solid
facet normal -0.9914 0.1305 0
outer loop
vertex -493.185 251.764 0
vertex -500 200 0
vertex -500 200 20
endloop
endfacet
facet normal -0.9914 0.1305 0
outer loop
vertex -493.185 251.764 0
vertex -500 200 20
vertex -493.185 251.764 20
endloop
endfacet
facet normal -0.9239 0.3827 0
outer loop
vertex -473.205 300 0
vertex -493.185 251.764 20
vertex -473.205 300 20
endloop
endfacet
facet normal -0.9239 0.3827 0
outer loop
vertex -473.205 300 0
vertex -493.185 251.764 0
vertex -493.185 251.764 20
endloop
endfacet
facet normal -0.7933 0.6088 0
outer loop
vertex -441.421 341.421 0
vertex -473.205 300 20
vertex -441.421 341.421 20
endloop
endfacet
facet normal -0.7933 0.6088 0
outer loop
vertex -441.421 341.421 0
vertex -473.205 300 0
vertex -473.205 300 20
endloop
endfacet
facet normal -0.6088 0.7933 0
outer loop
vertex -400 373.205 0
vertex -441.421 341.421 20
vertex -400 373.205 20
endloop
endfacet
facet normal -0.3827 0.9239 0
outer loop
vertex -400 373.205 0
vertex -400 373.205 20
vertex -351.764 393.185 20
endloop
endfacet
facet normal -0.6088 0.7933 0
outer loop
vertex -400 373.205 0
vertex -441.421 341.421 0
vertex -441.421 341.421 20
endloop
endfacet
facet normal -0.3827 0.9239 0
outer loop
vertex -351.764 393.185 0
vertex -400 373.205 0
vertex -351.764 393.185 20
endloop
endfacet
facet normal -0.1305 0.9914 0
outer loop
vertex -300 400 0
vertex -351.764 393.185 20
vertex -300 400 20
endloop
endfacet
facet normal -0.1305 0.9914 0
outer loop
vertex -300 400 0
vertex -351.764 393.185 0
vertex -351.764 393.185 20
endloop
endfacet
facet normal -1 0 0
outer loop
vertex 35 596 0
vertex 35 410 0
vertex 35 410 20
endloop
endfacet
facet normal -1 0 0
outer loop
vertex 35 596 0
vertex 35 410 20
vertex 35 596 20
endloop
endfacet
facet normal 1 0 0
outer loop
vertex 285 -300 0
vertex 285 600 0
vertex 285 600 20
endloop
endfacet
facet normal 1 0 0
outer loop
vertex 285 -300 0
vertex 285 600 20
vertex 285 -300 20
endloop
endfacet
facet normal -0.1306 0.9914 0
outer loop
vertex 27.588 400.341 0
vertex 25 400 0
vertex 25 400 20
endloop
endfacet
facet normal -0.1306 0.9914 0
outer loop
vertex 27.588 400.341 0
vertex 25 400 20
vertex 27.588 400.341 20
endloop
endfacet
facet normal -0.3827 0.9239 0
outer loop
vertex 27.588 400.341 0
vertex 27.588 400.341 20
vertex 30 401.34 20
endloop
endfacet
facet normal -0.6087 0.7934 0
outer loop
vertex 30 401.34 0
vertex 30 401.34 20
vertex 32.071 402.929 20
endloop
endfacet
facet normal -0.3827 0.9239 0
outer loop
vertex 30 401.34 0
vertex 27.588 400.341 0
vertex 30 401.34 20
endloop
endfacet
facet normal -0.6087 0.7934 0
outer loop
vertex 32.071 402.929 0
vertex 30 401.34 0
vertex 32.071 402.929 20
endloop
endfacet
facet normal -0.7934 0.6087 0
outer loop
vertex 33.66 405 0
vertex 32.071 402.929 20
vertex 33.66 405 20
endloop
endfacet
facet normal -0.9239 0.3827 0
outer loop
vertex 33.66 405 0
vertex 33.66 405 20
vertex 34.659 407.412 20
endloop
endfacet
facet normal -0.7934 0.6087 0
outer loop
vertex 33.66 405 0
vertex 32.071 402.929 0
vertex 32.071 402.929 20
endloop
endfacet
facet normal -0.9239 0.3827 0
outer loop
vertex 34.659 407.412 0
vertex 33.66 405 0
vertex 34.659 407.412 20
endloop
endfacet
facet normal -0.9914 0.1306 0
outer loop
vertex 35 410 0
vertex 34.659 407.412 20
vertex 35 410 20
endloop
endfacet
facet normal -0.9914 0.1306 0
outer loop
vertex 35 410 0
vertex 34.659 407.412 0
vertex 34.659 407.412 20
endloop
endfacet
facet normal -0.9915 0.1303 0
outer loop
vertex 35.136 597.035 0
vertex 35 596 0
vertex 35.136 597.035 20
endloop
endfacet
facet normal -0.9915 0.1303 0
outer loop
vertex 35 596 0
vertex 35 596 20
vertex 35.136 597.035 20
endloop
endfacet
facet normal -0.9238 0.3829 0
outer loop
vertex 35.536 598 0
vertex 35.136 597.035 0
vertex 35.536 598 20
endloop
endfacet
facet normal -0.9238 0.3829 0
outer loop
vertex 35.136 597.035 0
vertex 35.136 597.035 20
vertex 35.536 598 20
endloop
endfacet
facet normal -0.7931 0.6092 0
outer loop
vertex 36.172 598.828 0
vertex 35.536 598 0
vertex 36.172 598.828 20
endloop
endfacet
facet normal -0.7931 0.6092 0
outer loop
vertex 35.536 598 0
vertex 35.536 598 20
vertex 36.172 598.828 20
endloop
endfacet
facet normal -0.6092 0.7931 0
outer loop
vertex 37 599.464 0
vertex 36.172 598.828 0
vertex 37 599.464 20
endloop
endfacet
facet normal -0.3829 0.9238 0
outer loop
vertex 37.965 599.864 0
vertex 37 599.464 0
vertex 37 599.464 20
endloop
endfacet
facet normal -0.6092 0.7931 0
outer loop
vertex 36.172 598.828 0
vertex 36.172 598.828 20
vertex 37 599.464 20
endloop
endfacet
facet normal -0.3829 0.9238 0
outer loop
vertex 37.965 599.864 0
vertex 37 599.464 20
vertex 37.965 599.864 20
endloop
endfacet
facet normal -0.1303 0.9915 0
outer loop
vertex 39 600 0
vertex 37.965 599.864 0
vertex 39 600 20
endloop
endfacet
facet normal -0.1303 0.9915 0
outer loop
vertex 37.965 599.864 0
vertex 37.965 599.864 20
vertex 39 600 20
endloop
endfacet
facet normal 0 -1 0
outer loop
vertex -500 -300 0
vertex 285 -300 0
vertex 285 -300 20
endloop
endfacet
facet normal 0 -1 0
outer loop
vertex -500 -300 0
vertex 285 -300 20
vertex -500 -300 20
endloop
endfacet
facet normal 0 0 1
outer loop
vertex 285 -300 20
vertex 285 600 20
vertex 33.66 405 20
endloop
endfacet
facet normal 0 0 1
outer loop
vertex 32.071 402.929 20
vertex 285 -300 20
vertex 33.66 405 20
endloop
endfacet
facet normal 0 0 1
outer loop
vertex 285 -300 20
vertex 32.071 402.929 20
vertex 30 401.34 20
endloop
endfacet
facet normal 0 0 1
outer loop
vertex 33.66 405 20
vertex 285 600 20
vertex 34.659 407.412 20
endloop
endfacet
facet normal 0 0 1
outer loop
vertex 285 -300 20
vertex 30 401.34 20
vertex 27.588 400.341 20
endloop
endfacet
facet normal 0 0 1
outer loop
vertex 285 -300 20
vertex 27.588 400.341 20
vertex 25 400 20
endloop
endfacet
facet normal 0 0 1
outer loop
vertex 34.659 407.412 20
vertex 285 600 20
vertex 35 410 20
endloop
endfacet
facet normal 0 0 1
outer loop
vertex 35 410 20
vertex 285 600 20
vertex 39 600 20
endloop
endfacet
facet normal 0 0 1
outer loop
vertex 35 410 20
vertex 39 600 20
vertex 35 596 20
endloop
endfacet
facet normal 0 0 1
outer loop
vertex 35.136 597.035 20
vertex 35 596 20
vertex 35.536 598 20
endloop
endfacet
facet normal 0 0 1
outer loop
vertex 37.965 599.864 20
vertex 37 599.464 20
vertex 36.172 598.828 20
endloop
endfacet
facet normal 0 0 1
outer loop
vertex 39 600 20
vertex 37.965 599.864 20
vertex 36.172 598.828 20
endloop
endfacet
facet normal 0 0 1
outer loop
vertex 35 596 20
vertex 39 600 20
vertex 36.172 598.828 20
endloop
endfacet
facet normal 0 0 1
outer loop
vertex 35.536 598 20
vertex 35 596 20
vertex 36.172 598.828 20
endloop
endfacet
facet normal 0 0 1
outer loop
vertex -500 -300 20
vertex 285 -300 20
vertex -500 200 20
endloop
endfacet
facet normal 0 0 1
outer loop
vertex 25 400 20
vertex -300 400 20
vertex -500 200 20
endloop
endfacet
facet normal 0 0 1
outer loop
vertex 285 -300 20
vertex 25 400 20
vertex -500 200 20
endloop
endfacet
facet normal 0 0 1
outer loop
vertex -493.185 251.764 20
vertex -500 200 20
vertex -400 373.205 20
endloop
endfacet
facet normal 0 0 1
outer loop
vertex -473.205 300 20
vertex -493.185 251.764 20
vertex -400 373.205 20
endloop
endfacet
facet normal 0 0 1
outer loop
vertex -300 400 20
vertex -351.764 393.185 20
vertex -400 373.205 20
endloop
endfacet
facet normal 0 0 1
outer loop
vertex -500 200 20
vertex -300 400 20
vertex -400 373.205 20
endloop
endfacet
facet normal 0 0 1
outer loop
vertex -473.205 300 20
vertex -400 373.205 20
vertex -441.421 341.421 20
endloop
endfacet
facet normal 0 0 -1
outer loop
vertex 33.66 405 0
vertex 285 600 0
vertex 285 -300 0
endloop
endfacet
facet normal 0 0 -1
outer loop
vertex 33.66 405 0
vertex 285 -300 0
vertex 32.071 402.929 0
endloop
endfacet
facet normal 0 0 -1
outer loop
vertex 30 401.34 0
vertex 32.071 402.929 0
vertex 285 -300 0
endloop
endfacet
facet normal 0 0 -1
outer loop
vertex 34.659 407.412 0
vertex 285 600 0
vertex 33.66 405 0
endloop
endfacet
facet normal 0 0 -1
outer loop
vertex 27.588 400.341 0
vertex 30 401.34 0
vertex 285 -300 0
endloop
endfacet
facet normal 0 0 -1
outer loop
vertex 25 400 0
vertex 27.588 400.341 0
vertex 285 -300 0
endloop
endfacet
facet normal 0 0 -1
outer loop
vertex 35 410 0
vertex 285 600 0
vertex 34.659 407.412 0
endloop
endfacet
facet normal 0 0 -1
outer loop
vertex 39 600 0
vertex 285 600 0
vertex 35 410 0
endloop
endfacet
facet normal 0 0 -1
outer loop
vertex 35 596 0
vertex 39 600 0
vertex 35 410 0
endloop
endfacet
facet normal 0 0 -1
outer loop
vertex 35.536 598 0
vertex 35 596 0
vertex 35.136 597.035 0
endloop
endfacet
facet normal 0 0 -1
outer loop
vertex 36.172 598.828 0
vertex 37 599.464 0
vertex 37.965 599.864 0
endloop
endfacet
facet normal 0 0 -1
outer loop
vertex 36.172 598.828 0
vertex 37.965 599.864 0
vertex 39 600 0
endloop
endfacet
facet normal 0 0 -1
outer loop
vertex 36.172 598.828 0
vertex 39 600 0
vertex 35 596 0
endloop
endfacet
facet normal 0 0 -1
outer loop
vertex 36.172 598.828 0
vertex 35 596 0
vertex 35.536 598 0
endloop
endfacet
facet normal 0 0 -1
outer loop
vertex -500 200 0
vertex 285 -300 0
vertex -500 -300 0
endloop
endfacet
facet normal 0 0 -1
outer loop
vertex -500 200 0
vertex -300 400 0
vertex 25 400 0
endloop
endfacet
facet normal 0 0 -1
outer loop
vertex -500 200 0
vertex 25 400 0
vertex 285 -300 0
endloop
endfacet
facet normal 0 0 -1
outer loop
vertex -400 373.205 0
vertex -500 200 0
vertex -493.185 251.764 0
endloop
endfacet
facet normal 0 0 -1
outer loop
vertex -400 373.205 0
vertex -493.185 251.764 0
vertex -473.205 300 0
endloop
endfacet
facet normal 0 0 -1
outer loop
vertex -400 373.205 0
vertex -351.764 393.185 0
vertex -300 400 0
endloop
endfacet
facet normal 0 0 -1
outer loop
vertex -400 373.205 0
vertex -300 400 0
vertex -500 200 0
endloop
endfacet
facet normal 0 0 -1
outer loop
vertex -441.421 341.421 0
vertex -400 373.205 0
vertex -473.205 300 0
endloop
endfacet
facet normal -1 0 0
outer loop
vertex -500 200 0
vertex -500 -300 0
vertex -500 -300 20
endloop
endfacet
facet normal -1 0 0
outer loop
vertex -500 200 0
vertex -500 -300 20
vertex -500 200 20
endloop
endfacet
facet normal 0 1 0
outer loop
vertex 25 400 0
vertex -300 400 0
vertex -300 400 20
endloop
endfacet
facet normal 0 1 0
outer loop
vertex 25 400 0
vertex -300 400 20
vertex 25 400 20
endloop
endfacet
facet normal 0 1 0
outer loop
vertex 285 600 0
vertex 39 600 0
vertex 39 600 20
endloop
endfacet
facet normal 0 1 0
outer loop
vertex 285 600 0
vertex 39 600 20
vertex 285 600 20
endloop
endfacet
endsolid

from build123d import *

# Parameters (mm, degrees)
BOSS_EXTRUDE1_DEPTH = 20
FILLET1_R           = 4


with BuildPart() as part:
    # Sketch1 → Boss-Extrude1 (new body)
    with BuildSketch(Plane.XY):
        with BuildLine():
            Line((-300, 400), (25, 400))
            ThreePointArc((25, 400), (32.071067812, 402.928932188), (35, 410))
            Line((35, 410), (35, 600))
            Line((35, 600), (285, 600))
            Line((285, 600), (285, 100))
            Line((285, 100), (285, -300))
            Line((285, -300), (-500, -300))
            Line((-500, -300), (-500, 200))
            ThreePointArc((-500, 200), (-441.421356237, 341.421356237), (-300, 400))
        make_face()
    extrude(amount=BOSS_EXTRUDE1_DEPTH)

    # Fillet1
    fillet1_edges = [part.edges().sort_by_distance(p)[0] for p in [
        (35, 600, 10),
    ]]
    fillet(fillet1_edges, radius=FILLET1_R)


solid = part.part
